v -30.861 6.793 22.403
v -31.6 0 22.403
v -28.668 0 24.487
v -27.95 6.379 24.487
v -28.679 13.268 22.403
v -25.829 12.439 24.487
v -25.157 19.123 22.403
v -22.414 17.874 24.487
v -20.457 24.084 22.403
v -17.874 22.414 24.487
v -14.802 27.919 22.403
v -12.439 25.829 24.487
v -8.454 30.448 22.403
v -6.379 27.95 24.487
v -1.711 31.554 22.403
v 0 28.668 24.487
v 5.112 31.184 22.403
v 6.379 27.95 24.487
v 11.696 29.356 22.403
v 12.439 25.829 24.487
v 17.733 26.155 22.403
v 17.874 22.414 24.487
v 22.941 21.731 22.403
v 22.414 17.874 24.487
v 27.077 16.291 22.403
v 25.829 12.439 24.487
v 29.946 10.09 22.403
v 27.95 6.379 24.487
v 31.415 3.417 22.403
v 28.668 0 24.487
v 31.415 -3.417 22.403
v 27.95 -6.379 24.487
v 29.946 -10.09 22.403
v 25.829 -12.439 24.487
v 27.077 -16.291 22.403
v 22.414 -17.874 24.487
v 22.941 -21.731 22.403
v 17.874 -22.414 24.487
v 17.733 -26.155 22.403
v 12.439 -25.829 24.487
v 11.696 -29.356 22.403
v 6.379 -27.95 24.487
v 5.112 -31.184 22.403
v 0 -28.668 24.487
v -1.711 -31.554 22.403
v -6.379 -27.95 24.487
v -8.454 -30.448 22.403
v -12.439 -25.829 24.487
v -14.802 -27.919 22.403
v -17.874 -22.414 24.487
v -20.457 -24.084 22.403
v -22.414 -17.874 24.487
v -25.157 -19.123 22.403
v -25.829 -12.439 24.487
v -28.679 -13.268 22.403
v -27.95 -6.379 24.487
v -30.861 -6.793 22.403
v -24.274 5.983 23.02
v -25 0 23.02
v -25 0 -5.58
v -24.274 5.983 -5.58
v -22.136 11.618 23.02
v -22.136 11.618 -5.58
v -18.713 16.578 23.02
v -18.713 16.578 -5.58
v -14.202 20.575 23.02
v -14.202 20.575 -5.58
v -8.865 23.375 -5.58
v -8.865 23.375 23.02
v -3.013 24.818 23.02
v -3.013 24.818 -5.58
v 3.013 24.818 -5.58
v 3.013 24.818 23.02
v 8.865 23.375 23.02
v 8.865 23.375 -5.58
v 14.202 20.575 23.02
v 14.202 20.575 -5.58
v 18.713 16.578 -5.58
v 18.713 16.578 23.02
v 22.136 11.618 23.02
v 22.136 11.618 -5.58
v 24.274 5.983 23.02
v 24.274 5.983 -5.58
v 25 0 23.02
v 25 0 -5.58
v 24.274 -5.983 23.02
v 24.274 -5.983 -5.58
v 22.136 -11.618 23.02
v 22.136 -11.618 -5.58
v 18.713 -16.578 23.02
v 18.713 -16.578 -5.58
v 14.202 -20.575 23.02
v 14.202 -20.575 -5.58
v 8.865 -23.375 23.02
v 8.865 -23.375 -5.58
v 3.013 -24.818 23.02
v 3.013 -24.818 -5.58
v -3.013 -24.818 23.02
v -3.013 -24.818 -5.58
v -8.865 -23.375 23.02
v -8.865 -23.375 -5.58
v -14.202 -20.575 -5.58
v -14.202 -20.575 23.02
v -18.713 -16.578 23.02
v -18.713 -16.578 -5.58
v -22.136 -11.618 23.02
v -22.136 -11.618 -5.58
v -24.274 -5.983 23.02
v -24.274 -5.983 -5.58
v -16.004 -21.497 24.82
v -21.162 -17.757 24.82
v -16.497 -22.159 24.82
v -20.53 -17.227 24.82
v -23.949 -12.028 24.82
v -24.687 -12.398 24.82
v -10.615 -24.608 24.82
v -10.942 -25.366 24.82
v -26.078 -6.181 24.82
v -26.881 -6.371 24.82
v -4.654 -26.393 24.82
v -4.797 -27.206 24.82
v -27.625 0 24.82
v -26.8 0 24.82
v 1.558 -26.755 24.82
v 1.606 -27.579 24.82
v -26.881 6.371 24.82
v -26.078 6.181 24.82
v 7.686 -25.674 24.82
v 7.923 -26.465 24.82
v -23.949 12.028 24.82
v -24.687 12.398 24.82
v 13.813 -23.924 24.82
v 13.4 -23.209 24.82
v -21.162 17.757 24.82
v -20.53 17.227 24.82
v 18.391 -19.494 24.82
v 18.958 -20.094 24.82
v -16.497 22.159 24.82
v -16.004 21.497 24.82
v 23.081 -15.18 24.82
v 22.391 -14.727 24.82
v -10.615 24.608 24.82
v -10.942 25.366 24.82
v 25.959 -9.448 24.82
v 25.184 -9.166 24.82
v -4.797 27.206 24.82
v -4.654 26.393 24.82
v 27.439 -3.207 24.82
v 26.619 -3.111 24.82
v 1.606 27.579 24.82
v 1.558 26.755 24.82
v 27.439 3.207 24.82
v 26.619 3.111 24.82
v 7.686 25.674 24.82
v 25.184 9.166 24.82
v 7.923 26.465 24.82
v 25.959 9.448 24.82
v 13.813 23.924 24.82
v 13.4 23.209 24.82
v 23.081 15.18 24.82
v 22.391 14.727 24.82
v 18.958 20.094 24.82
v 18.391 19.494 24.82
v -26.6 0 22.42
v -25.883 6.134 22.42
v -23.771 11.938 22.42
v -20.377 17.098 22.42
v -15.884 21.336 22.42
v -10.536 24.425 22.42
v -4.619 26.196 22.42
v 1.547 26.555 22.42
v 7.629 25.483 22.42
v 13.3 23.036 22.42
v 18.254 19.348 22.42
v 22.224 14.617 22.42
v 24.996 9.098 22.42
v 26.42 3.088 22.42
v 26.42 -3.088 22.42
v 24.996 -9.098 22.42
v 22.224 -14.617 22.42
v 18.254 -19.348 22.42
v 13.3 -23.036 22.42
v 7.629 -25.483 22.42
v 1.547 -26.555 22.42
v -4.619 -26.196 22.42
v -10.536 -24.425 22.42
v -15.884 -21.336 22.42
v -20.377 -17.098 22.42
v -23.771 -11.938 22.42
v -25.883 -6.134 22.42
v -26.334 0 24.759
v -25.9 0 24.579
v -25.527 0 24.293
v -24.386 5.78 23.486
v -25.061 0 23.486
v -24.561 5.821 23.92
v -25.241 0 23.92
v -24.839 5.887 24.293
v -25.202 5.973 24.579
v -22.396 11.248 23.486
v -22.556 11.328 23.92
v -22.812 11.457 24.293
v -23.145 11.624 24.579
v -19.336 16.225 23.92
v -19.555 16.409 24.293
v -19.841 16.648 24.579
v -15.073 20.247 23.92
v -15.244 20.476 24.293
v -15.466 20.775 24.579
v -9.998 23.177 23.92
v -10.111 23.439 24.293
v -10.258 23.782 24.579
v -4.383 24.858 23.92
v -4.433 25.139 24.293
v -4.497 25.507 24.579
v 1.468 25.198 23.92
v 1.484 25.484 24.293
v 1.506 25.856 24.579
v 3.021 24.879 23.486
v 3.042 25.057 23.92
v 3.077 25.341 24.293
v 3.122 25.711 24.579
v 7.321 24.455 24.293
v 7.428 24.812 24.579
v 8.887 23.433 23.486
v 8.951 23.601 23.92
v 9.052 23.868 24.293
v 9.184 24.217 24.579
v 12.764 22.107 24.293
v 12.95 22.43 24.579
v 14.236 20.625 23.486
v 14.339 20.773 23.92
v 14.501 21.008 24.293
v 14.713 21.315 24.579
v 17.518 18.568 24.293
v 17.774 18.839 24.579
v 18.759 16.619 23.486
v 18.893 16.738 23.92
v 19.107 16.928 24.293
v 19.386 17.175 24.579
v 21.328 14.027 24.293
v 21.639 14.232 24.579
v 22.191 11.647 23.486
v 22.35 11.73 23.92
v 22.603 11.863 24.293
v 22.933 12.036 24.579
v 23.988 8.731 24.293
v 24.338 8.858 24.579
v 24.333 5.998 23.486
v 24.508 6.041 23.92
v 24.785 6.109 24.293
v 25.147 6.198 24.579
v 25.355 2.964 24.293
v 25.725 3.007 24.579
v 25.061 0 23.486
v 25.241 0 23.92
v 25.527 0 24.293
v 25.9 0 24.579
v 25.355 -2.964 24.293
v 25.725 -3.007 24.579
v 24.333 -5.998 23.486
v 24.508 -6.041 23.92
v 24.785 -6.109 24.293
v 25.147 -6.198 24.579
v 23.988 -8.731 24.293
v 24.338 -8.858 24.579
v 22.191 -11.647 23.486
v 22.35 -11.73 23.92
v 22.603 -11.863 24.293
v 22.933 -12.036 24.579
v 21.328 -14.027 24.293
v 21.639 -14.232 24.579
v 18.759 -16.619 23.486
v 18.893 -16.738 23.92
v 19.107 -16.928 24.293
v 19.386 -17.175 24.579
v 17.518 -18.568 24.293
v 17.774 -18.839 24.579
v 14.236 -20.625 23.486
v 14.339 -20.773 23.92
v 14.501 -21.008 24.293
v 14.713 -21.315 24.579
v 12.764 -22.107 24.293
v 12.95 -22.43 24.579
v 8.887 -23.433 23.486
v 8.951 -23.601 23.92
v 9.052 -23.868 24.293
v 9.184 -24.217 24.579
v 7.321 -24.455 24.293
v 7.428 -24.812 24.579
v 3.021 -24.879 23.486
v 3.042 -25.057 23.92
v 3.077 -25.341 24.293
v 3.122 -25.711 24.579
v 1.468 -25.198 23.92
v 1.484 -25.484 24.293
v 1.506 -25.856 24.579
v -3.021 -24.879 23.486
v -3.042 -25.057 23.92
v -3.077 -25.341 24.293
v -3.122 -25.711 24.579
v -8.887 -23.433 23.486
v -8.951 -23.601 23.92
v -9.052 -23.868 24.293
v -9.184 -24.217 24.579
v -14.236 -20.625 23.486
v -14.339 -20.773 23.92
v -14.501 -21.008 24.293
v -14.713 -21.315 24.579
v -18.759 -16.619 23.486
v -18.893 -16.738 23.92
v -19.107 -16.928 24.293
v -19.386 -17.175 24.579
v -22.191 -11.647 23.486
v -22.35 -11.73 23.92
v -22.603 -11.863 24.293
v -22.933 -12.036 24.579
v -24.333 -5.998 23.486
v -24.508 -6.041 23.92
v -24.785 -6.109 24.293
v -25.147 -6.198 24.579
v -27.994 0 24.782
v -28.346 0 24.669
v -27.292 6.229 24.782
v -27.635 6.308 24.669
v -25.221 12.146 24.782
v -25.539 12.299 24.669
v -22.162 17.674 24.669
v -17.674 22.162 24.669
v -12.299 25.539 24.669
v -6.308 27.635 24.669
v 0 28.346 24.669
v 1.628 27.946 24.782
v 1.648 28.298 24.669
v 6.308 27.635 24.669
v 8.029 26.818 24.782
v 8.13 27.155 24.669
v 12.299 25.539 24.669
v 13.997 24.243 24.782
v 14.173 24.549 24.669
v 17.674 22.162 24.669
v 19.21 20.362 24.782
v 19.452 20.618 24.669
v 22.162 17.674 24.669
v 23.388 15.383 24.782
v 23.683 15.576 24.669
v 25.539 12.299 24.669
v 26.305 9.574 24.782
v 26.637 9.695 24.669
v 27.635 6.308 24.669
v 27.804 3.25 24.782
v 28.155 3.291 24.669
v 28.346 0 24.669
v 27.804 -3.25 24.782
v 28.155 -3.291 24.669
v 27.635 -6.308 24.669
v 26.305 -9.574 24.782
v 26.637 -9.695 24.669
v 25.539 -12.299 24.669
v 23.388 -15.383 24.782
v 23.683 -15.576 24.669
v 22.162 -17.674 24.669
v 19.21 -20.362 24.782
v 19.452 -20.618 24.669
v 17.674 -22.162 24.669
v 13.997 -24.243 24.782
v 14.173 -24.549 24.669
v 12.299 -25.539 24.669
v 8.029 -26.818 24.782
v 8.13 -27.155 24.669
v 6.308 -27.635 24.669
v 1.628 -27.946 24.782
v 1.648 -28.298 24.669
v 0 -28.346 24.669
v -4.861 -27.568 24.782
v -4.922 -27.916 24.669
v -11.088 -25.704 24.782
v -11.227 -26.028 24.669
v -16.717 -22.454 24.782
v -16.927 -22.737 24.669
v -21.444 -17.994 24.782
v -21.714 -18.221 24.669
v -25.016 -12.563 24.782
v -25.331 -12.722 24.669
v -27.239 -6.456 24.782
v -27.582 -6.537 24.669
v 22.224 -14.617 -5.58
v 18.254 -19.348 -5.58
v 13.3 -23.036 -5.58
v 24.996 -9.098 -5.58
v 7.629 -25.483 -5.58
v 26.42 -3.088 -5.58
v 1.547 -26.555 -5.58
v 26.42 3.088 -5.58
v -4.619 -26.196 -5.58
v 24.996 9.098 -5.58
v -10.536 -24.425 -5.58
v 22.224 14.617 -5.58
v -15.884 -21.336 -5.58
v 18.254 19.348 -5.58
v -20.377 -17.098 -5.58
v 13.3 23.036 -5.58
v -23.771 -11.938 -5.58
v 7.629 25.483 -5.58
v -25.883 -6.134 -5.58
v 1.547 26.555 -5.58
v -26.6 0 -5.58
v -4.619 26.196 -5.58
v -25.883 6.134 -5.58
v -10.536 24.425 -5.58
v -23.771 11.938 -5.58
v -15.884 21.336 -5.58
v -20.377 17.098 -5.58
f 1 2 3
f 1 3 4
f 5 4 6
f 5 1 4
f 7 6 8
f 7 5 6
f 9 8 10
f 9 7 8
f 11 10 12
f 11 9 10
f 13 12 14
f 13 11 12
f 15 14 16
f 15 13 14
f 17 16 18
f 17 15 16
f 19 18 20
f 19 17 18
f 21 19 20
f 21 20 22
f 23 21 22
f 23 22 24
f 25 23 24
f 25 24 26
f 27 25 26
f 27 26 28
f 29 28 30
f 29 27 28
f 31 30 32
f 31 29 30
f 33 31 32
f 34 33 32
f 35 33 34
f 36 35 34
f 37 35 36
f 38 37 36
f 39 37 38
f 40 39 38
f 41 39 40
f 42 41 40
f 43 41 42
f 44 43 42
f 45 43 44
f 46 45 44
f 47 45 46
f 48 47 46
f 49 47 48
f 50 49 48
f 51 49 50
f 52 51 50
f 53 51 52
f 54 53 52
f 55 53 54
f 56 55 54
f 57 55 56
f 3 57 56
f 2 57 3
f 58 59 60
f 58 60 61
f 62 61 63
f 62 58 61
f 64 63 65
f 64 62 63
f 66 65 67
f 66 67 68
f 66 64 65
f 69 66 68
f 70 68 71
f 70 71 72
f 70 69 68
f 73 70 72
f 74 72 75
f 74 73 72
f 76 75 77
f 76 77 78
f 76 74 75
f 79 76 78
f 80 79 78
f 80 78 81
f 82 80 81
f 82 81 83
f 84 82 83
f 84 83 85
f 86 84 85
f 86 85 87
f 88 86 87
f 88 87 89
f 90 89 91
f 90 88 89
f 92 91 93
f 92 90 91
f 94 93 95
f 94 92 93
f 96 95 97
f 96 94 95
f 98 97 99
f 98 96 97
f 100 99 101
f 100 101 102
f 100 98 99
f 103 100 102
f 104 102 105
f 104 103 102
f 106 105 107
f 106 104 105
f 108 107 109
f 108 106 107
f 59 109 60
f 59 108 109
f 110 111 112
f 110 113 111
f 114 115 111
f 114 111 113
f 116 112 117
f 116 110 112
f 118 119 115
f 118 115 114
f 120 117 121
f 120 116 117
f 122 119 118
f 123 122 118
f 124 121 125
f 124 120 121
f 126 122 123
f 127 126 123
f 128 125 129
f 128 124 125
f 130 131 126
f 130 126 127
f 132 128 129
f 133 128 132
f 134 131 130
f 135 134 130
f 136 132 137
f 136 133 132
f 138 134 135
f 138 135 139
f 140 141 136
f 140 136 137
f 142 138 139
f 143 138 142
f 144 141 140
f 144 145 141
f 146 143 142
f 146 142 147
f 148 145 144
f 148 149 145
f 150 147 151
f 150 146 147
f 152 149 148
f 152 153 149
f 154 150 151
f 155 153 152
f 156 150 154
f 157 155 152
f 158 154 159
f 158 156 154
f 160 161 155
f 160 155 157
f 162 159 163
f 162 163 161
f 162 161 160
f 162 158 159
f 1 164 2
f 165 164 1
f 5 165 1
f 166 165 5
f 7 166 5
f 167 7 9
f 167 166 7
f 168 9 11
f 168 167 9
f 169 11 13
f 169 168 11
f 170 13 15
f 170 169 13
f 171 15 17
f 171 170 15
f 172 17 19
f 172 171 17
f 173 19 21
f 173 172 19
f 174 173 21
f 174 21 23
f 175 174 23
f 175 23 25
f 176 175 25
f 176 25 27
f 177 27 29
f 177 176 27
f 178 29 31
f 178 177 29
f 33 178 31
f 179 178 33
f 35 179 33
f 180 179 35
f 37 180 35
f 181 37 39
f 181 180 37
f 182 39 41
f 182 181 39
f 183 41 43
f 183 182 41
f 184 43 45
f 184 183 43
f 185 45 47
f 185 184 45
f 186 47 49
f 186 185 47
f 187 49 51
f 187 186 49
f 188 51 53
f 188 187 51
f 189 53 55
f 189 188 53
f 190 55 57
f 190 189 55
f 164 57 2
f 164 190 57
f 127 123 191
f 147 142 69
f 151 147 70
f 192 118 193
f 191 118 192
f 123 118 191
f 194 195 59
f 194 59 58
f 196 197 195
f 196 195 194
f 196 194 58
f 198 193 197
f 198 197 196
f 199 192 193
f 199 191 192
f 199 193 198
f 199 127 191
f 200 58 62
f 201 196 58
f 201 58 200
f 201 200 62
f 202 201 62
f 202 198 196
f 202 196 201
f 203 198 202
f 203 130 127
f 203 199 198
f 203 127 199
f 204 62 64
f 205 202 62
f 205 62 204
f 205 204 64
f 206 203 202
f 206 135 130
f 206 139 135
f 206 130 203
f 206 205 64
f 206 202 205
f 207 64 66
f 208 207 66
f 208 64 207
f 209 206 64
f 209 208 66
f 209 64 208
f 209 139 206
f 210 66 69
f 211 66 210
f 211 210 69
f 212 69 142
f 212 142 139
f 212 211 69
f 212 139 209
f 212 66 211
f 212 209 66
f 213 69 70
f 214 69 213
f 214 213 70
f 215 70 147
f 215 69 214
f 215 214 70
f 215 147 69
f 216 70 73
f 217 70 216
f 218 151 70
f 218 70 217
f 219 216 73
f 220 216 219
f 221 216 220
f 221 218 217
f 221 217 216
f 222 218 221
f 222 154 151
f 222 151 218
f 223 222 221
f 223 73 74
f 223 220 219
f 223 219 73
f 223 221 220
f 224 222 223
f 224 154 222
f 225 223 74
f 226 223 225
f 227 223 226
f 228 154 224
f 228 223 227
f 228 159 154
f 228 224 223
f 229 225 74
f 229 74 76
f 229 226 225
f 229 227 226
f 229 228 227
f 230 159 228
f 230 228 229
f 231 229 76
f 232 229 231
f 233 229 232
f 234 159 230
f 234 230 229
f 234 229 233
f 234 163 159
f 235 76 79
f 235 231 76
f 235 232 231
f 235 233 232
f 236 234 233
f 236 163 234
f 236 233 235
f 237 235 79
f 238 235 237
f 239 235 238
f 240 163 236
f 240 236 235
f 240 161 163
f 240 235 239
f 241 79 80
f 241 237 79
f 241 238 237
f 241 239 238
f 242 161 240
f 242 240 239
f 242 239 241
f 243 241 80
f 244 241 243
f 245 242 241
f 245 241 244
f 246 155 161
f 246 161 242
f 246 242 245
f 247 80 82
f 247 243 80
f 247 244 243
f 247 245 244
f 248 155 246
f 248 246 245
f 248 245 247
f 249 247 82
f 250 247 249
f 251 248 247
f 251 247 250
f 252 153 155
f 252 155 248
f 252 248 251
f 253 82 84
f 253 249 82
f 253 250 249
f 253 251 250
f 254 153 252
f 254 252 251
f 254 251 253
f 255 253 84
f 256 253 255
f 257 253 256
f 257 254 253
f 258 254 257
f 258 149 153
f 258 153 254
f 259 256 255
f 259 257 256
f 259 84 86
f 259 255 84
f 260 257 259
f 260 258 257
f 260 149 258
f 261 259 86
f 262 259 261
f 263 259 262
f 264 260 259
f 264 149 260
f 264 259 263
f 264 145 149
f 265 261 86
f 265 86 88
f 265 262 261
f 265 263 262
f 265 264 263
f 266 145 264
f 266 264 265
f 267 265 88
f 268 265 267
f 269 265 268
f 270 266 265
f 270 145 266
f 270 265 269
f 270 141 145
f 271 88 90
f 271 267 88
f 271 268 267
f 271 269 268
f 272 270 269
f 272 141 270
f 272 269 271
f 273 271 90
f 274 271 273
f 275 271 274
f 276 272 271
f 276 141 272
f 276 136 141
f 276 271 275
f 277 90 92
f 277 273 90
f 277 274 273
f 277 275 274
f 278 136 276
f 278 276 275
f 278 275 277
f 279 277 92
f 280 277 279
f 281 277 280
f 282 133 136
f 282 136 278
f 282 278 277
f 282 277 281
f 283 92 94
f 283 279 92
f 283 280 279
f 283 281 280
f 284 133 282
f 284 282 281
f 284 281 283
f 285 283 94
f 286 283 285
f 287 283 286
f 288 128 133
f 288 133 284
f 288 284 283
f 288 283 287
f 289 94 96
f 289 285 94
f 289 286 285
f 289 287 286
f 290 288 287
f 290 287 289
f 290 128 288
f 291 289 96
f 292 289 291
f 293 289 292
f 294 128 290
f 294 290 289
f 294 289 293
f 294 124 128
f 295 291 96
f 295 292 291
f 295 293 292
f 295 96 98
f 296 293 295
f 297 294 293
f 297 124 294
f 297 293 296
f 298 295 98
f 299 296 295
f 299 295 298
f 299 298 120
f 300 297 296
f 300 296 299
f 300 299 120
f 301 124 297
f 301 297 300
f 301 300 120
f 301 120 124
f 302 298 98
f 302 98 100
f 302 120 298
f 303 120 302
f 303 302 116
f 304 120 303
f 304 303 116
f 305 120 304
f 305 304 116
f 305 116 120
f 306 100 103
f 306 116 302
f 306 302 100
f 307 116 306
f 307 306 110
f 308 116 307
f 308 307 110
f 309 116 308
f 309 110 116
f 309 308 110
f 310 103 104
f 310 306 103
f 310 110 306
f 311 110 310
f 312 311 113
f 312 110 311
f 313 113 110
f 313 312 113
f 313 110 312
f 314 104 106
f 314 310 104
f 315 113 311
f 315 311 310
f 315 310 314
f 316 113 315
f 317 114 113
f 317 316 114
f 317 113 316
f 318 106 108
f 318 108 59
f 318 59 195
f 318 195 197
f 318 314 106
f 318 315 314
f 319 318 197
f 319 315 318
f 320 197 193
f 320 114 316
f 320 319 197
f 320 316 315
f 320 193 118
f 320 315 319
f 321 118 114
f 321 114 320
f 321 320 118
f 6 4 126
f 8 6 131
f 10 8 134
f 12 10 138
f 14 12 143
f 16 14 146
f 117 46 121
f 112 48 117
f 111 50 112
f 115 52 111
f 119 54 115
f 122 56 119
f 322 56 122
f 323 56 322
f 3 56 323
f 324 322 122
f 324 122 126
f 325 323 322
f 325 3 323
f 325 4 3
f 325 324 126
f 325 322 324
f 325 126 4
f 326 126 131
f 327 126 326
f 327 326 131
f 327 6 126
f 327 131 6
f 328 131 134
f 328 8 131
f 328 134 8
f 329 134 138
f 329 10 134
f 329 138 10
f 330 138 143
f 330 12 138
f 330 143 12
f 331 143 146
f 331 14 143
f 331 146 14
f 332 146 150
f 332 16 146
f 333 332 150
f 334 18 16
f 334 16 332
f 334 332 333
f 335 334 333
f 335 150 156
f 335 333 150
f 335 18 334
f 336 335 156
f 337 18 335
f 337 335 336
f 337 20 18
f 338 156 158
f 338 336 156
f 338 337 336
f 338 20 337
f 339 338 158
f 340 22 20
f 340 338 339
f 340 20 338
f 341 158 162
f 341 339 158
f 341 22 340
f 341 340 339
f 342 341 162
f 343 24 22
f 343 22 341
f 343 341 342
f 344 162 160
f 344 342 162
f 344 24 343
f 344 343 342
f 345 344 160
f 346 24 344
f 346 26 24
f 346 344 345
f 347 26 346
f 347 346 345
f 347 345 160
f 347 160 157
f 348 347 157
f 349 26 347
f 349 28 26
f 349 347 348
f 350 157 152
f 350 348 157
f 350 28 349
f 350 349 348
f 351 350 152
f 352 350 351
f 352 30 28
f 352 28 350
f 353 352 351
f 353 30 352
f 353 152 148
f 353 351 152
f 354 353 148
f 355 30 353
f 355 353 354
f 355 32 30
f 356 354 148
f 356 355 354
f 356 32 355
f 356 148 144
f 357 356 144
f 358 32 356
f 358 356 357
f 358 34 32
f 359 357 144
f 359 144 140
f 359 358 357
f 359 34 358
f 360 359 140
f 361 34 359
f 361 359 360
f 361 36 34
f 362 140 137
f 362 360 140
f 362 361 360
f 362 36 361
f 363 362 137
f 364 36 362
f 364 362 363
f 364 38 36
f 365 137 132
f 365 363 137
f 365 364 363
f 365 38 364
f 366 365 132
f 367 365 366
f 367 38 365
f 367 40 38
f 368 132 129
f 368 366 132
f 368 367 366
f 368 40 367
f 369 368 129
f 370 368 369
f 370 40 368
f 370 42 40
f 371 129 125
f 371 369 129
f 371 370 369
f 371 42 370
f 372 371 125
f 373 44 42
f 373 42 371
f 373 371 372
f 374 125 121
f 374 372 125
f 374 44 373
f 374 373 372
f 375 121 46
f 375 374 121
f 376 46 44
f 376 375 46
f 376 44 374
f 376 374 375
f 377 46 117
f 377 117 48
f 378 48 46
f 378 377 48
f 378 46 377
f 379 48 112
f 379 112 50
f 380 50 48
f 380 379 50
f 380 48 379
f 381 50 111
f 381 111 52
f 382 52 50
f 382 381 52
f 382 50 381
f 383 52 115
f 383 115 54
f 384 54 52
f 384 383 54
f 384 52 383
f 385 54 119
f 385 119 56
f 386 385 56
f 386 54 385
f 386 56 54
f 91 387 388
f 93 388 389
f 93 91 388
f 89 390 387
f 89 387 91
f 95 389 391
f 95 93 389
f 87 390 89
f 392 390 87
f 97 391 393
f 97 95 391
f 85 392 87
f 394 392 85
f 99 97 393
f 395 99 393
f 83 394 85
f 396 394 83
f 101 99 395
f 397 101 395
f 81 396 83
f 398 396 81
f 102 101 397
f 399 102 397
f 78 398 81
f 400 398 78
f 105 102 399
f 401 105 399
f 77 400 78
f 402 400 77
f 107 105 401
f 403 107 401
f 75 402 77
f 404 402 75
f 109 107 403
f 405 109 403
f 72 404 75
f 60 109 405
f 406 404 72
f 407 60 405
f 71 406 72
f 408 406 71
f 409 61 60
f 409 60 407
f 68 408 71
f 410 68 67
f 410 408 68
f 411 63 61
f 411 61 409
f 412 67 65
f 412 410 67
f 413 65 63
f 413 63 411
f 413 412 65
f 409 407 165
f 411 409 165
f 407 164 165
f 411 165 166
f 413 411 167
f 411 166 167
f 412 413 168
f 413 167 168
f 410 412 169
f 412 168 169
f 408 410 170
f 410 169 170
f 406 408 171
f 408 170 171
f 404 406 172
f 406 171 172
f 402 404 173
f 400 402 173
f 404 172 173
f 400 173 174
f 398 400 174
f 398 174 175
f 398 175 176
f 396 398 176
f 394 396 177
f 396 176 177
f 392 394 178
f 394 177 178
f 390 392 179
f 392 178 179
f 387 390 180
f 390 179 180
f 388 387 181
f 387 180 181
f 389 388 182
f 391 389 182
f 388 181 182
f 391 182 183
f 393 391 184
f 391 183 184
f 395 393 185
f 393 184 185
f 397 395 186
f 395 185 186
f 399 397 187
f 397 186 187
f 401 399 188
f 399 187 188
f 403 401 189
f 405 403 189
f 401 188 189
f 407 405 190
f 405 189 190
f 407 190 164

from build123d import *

# Parameters (mm, degrees)
F0_W = 1.6
F0_H = 28
F2_R = 1.8


with BuildPart() as f1:
    # F0 (on Front) → F1 (revolve)
    with BuildSketch(Plane.XZ):
        Polygon((-31.599971, 22.402998), (-26.6, 22.419994), (-25, 22.419994), (-25, 24.819994), (-28.2, 24.819994), align=None)
        with Locations((-25.8, 8.419994)):
            Rectangle(F0_W, F0_H)
    revolve(axis=Axis((0, 0, -8.381579), (0, 0, -1)))

    # F2
    f2_edges = [f1.edges().sort_by_distance(p)[0] for p in [
        (25, 0, 24.819994),
        (28.2, 0, 24.819994),
    ]]
    fillet(f2_edges, radius=F2_R)


solid = f1.part
